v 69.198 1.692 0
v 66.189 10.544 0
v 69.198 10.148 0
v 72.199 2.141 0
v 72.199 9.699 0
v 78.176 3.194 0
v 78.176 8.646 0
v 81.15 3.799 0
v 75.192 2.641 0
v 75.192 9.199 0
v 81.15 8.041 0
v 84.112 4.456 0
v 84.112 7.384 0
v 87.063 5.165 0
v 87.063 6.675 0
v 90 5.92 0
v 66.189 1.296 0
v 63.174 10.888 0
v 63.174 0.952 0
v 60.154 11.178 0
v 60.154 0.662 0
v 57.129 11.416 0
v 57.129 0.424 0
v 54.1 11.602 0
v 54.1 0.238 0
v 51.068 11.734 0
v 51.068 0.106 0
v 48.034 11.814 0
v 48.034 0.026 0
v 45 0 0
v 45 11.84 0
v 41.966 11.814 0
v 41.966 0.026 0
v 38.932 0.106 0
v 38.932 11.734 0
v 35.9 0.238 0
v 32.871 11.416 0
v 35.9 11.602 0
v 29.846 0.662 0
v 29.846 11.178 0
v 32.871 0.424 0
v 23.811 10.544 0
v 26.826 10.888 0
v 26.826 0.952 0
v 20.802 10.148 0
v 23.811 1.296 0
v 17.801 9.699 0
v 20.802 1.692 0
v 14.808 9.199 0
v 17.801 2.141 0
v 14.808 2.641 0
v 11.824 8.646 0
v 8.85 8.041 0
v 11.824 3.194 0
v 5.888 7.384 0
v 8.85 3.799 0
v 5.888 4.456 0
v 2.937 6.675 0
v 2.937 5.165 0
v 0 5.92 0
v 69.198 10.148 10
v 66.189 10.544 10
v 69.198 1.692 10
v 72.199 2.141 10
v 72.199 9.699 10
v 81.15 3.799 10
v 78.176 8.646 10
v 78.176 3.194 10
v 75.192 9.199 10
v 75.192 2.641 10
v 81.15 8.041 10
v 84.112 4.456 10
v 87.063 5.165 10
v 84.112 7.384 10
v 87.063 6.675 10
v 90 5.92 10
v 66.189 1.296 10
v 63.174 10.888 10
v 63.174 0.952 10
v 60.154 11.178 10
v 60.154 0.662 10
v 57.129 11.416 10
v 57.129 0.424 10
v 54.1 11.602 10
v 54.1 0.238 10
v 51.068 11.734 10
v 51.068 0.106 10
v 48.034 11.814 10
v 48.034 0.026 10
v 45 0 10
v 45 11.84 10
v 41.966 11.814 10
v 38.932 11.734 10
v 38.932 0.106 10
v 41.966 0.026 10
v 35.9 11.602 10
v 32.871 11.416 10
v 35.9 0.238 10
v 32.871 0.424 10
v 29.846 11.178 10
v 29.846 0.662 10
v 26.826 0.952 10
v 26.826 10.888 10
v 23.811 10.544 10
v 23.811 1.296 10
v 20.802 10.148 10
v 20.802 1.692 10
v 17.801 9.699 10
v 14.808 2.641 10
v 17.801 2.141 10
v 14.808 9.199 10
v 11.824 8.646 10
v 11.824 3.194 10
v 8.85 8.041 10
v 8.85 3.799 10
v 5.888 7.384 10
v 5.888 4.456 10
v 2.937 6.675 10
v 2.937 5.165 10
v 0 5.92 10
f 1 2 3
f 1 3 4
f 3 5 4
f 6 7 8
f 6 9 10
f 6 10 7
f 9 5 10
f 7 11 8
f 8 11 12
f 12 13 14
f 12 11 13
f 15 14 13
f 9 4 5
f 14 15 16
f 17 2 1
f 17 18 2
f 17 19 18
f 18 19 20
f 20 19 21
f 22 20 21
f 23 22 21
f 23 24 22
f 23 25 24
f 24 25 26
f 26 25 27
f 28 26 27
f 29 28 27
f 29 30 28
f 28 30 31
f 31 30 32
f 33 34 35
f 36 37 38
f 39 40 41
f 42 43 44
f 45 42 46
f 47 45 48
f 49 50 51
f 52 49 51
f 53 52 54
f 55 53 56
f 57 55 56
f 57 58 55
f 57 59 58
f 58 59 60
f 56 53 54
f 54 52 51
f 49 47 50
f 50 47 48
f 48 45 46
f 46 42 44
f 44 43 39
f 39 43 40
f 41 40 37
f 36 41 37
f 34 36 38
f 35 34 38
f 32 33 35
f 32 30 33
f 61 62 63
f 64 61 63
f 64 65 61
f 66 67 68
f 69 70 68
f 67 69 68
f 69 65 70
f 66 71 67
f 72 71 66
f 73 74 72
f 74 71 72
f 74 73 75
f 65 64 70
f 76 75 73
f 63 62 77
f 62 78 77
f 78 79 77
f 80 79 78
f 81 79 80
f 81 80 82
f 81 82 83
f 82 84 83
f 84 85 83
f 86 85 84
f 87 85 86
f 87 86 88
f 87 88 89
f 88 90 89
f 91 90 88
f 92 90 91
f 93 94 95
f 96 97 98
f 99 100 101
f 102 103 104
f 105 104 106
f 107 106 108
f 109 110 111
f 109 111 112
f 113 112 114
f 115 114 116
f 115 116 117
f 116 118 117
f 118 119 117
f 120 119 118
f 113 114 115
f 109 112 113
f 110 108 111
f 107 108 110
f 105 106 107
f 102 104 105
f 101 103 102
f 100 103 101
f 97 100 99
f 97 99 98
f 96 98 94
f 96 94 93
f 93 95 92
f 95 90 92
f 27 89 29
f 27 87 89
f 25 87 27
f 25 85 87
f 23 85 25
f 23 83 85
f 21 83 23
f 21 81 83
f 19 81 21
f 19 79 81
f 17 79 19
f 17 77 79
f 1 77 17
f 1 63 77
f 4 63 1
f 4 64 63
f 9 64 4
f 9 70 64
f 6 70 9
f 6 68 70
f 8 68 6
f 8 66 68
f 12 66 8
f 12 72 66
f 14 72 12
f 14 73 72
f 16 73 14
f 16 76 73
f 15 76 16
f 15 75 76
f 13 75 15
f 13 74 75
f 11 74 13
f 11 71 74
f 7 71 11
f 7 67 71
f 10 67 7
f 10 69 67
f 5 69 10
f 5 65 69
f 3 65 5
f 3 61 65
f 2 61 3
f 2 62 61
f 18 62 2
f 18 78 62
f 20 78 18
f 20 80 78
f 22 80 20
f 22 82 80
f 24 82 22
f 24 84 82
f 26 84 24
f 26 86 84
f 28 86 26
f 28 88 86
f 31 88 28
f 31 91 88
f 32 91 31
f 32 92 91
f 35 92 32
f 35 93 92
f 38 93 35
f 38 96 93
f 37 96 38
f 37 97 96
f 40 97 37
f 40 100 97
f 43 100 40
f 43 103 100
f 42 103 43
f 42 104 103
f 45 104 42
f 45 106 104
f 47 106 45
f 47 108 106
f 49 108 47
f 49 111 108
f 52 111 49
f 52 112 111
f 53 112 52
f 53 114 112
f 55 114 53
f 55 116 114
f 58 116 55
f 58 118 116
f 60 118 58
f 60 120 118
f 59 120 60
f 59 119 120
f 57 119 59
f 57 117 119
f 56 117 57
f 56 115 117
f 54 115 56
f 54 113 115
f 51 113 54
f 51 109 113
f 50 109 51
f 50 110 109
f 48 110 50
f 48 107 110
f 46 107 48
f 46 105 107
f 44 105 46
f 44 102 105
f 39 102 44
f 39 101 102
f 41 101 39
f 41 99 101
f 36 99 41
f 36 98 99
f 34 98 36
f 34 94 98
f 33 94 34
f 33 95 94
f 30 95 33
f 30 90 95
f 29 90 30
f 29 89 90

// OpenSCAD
$fn = 32;

// ----------------------------------------------------------------------
// Arc profile plate: lens, 60 points
// ----------------------------------------------------------------------

// --- parameters (mm) ---
lens_chord = 90;          // chord length of the lens, X
arc_r = 173.87;           // radius of both arcs
arc_angle = 30;           // angle of each arc, degrees
sagitta = 5.92;           // bulge of each arc (half the lens height)
arc_step = 1;             // sampling step of the arcs, degrees
plate_t = 10;             // plate thickness, Z
fit_tol = 0.02;           // declared fit tolerance (prompt contract)
free_tol = 0.2;           // declared free tolerance (prompt contract)

bbox_y = 2 * sagitta;  // full lens height

profile = [[90, 5.92], [87.063, 6.675], [84.112, 7.384], [81.15, 8.041], [78.176, 8.646], [75.192, 9.199], [72.199, 9.699], [69.198, 10.148], [66.189, 10.544], [63.174, 10.888], [60.154, 11.178], [57.129, 11.416], [54.1, 11.602], [51.068, 11.734], [48.034, 11.814], [45, 11.84], [41.966, 11.814], [38.932, 11.734], [35.9, 11.602], [32.871, 11.416], [29.846, 11.178], [26.826, 10.888], [23.811, 10.544], [20.802, 10.148], [17.801, 9.699], [14.808, 9.199], [11.824, 8.646], [8.85, 8.041], [5.888, 7.384], [2.937, 6.675], [0, 5.92], [2.937, 5.165], [5.888, 4.456], [8.85, 3.799], [11.824, 3.194], [14.808, 2.641], [17.801, 2.141], [20.802, 1.692], [23.811, 1.296], [26.826, 0.952], [29.846, 0.662], [32.871, 0.424], [35.9, 0.238], [38.932, 0.106], [41.966, 0.026], [45, 0], [48.034, 0.026], [51.068, 0.106], [54.1, 0.238], [57.129, 0.424], [60.154, 0.662], [63.174, 0.952], [66.189, 1.296], [69.198, 1.692], [72.199, 2.141], [75.192, 2.641], [78.176, 3.194], [81.15, 3.799], [84.112, 4.456], [87.063, 5.165]];  // primary outline, 60 points, counter clockwise

// --- the one profile operation ---
linear_extrude(height = plate_t) polygon(points = profile);
